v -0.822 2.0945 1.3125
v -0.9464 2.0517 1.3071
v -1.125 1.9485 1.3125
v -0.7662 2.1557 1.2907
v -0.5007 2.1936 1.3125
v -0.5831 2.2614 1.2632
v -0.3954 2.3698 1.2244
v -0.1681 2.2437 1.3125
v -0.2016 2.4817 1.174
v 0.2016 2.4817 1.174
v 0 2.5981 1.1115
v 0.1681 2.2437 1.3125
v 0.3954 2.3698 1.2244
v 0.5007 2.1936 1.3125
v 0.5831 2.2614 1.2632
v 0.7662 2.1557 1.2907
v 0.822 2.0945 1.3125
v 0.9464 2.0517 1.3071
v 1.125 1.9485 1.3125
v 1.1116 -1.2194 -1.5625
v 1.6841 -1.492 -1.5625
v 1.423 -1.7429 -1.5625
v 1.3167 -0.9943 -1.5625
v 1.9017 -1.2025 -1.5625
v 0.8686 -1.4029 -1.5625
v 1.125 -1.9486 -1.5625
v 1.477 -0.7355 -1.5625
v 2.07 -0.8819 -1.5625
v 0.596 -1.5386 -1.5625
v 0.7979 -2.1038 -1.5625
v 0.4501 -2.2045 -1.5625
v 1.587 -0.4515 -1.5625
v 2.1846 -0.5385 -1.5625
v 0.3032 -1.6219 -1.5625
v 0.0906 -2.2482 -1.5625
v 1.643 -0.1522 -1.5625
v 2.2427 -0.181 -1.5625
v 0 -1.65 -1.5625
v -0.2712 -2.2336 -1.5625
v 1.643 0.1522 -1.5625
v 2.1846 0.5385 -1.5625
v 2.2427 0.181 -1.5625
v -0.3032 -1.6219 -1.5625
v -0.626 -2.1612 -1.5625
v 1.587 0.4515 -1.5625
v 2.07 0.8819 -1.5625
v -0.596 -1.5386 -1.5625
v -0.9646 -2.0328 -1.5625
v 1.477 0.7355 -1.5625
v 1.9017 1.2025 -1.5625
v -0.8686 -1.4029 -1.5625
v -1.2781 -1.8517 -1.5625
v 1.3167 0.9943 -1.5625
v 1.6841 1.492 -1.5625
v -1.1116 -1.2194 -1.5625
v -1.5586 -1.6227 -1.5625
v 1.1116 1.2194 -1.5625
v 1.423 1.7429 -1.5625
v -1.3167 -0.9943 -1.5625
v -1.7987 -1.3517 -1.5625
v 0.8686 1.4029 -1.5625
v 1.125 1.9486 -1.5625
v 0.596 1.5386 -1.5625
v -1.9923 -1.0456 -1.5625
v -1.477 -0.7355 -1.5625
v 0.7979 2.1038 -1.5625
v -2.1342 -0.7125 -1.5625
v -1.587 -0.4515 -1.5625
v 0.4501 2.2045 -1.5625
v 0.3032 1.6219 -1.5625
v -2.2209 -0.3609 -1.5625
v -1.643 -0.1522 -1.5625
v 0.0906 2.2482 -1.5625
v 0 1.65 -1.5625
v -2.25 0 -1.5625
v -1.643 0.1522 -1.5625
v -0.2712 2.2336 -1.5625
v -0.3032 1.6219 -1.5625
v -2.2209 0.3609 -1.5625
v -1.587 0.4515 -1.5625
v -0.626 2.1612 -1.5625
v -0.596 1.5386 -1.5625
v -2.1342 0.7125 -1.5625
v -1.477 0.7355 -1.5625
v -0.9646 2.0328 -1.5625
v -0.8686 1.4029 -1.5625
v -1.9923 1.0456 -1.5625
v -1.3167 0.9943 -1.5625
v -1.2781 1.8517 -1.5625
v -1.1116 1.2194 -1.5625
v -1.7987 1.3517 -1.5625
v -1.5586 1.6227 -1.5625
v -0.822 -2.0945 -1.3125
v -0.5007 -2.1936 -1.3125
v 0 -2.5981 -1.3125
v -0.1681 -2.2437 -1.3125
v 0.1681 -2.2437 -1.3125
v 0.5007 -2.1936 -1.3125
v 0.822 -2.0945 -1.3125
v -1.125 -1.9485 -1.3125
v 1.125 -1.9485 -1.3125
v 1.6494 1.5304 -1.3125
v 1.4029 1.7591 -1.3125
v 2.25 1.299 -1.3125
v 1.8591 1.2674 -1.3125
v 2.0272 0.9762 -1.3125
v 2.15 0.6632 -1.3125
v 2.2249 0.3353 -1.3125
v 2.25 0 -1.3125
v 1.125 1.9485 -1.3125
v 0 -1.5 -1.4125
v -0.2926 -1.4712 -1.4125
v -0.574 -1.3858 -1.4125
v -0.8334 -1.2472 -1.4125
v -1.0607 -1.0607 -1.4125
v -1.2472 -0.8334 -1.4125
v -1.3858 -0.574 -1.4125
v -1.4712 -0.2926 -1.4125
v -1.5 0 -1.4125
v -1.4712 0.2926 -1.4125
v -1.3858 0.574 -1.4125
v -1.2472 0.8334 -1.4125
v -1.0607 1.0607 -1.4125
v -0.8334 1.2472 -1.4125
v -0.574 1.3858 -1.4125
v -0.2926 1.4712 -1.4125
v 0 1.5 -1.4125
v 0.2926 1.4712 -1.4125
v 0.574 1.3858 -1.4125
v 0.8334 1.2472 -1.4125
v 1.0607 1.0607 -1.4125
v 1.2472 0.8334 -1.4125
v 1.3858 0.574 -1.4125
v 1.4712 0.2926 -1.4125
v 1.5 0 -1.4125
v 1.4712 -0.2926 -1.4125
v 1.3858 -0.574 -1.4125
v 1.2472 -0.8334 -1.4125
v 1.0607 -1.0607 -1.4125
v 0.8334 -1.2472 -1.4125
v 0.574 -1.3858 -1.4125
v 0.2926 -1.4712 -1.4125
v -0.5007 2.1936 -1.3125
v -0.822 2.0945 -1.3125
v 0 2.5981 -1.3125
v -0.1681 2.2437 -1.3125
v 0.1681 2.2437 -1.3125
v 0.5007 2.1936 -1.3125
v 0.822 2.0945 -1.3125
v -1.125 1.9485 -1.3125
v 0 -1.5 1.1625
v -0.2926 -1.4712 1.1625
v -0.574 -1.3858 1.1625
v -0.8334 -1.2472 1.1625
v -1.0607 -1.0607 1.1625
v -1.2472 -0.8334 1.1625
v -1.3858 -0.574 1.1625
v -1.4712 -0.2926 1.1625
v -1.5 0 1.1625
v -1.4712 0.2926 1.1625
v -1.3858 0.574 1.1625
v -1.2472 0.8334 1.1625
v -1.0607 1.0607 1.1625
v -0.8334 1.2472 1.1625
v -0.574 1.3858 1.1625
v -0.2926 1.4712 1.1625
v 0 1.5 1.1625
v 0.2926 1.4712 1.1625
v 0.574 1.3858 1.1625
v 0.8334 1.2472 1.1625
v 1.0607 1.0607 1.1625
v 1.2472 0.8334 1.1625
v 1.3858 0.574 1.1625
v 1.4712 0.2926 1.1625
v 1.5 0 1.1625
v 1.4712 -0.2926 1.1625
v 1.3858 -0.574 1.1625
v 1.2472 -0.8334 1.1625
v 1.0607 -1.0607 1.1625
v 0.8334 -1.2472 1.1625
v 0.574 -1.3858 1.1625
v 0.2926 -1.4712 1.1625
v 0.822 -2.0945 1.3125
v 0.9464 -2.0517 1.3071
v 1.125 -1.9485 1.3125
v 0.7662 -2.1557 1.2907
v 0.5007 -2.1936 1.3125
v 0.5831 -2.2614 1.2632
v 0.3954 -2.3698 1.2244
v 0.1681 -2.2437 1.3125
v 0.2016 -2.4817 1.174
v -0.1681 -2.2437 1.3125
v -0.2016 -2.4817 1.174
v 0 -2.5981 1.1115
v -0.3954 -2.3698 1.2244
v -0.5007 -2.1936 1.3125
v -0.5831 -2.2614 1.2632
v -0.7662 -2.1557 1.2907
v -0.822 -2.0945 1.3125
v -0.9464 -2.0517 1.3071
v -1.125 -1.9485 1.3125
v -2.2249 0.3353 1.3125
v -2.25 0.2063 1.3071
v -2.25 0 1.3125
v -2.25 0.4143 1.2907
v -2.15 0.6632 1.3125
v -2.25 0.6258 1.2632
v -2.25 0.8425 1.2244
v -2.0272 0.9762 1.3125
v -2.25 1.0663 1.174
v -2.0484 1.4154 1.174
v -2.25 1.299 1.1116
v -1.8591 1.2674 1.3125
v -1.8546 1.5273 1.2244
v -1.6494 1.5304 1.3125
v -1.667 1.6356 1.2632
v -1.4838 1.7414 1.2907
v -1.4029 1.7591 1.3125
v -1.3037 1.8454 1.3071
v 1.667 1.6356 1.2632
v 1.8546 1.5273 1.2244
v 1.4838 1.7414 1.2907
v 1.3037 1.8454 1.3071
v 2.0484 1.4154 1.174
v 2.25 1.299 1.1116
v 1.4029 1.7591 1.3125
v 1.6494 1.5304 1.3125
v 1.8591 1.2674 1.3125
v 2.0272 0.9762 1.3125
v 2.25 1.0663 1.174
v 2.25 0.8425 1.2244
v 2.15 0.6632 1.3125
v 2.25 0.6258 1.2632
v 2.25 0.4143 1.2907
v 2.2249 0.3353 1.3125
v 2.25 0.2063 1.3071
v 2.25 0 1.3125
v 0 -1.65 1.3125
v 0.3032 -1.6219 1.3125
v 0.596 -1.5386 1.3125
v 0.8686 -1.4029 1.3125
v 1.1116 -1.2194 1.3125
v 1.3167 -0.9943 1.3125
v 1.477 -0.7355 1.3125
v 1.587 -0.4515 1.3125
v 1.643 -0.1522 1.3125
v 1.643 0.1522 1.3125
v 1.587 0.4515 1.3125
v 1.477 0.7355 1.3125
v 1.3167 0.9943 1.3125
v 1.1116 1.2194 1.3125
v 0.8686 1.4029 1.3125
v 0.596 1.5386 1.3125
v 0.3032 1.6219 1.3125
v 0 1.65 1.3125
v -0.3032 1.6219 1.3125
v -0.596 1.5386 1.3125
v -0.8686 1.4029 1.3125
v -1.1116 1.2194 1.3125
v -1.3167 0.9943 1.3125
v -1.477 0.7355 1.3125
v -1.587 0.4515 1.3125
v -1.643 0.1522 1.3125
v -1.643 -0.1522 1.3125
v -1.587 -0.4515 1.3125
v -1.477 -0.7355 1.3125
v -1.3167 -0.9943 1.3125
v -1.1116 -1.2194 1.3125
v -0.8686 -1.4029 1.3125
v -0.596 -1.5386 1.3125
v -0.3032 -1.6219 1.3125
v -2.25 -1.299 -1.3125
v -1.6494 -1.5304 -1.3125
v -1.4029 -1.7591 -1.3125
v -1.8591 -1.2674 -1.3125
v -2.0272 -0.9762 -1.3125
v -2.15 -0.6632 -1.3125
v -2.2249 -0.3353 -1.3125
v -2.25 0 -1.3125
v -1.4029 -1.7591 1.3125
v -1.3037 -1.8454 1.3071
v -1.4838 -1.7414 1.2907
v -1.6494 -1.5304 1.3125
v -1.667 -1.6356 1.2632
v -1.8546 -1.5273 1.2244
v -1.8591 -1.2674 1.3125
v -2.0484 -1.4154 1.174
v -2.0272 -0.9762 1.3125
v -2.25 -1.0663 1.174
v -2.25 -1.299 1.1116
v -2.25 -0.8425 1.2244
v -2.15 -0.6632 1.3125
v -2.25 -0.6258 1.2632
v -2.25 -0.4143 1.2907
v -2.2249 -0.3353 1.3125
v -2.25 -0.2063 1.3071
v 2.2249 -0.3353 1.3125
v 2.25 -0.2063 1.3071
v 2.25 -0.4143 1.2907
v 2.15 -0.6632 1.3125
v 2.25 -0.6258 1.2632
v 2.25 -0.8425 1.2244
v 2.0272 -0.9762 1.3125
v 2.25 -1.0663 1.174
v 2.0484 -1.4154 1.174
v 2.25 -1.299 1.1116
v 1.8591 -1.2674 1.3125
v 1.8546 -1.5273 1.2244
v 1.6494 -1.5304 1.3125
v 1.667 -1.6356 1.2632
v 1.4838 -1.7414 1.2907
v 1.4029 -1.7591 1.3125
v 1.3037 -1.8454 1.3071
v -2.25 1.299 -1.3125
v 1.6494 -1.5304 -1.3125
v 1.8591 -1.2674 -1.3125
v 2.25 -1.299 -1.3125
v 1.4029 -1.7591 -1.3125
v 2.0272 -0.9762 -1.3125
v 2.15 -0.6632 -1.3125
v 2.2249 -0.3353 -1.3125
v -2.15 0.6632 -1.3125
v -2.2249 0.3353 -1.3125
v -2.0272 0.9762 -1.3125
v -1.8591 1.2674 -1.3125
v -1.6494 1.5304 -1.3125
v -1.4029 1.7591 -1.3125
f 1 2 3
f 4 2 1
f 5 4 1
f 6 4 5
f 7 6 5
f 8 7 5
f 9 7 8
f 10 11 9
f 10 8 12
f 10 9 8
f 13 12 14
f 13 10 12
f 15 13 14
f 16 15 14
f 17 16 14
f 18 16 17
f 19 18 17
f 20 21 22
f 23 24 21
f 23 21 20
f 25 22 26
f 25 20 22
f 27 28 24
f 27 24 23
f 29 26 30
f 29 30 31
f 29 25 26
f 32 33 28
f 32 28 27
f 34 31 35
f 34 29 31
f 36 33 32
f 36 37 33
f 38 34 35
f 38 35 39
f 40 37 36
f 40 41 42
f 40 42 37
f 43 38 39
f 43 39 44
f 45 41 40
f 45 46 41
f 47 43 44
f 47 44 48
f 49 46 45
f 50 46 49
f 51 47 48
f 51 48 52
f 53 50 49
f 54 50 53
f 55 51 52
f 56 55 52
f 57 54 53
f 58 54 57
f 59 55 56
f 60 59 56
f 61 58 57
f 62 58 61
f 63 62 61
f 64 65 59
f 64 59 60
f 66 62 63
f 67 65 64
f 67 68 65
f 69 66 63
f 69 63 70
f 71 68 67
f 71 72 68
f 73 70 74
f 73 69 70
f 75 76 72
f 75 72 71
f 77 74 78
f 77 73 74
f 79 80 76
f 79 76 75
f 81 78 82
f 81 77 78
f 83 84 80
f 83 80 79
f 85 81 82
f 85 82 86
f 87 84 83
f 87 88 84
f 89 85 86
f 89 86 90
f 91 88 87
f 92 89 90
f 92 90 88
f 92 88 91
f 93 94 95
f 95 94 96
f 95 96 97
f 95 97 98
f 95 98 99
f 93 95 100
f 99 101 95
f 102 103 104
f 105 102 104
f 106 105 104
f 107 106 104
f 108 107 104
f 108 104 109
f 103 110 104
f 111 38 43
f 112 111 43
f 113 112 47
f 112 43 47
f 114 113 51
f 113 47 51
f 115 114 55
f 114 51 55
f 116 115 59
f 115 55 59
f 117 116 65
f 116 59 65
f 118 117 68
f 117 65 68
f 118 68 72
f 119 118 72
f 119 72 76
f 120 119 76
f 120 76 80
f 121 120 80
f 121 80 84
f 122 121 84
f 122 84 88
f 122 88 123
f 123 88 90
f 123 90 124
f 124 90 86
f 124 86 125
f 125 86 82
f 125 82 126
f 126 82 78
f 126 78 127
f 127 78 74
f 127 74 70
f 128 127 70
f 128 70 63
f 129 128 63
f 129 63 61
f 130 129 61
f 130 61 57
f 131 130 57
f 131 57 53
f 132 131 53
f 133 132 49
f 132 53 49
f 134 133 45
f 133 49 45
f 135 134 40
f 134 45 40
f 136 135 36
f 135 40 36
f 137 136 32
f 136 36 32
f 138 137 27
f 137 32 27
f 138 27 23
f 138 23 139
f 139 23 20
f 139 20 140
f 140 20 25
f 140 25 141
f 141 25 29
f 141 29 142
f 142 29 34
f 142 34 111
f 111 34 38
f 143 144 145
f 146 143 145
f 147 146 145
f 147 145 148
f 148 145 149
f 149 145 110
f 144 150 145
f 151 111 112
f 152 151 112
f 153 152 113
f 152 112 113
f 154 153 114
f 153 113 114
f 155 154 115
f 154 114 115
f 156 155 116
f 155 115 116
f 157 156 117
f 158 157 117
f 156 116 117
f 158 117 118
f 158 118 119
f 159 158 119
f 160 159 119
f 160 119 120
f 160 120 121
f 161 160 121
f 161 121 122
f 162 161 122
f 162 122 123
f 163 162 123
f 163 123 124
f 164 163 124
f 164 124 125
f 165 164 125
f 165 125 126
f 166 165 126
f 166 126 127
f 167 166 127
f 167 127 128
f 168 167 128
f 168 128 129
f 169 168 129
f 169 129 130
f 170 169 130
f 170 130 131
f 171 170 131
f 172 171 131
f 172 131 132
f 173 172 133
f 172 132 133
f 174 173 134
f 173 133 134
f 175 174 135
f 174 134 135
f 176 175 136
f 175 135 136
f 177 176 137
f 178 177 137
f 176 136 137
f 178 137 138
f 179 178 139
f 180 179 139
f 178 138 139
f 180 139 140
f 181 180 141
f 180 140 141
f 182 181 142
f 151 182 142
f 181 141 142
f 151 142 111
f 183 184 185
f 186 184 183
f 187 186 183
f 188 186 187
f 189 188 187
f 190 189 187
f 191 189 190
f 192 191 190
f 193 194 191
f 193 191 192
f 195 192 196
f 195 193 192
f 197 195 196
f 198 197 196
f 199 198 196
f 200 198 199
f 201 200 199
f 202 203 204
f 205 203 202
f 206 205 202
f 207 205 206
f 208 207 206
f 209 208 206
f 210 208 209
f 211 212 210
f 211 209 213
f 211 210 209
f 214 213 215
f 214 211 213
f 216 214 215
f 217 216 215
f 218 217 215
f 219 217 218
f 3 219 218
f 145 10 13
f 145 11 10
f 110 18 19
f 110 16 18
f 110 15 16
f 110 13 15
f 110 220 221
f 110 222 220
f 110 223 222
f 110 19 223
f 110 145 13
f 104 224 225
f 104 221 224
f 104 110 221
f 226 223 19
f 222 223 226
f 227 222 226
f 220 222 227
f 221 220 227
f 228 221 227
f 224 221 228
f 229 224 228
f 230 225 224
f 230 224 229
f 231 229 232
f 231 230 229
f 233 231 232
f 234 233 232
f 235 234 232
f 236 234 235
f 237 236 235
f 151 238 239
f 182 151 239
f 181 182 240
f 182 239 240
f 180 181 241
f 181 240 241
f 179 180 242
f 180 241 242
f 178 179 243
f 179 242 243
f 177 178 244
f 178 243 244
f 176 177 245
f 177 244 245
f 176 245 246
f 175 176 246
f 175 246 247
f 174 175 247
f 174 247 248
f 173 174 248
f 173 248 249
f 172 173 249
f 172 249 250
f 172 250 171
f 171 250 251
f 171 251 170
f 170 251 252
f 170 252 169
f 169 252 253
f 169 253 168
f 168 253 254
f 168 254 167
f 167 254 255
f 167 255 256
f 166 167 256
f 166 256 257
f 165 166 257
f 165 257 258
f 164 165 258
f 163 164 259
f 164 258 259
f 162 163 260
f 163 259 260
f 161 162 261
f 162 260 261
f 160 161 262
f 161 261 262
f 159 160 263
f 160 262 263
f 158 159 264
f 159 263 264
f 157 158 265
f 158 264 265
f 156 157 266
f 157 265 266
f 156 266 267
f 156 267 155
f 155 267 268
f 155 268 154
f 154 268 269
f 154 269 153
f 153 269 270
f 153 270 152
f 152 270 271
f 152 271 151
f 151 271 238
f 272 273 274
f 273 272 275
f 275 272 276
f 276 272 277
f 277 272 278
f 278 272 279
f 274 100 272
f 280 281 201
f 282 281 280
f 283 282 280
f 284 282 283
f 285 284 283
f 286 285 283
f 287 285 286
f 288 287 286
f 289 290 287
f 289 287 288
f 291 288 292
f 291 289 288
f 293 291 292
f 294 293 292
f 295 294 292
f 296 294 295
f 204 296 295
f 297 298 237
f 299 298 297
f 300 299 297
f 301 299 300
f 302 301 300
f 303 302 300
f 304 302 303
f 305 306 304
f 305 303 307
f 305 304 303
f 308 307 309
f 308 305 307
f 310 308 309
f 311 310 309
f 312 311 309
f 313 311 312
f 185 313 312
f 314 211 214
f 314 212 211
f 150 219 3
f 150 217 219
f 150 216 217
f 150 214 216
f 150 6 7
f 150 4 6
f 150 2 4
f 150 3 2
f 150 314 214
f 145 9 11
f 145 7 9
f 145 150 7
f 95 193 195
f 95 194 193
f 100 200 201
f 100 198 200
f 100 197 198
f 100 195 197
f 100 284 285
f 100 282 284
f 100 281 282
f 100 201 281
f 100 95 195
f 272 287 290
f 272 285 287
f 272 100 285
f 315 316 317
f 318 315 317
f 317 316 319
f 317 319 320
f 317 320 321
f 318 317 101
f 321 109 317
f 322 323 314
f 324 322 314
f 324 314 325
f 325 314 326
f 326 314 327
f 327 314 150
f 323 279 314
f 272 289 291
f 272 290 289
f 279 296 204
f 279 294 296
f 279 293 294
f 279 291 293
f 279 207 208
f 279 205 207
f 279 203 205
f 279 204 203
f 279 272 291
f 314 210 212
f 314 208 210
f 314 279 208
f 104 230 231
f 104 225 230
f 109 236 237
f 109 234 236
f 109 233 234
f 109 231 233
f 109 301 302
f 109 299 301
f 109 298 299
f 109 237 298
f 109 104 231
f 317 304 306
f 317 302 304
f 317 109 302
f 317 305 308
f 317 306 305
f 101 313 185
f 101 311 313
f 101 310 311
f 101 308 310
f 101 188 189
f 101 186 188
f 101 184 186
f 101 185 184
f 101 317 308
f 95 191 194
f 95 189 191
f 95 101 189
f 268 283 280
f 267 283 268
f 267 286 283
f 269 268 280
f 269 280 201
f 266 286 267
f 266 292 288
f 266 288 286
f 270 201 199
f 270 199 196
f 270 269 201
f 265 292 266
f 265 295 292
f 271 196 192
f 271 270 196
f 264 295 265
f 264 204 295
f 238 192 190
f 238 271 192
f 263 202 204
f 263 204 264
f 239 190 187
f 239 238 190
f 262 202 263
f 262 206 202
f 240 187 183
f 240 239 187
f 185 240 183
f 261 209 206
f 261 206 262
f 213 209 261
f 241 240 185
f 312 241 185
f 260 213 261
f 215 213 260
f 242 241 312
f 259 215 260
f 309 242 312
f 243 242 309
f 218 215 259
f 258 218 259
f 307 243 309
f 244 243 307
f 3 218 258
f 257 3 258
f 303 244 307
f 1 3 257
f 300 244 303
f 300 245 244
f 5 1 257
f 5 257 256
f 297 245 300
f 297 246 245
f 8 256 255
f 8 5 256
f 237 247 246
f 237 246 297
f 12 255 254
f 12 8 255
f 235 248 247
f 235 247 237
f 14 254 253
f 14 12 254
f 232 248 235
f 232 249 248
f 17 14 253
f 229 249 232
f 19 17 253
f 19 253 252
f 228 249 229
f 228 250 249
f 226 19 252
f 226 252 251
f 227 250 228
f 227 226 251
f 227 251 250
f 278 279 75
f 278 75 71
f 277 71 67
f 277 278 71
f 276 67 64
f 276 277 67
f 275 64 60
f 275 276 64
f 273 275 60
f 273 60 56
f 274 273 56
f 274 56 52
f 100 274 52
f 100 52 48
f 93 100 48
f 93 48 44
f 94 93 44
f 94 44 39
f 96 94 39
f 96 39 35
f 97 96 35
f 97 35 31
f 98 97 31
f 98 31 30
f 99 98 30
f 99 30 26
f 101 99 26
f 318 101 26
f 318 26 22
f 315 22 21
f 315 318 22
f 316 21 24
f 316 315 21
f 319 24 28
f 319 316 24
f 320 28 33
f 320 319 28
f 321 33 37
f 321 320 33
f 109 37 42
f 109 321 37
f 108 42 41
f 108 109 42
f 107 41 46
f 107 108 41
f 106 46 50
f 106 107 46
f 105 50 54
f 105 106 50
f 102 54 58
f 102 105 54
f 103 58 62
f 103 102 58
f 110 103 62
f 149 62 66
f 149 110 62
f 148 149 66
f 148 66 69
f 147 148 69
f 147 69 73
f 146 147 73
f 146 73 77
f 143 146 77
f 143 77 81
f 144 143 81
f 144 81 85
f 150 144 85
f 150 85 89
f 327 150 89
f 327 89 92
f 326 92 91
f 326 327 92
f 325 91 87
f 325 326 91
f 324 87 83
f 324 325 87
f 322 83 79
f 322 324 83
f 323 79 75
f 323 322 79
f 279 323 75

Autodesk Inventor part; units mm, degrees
ref_plane "YZ Plane" through (0, 0, 0) normal (1, 0, 0) x (0, 1, 0)
ref_plane "XZ Plane" through (0, 0, 0) normal (0, 1, 0) x (-1, 0, 0)
ref_plane "XY Plane" through (0, 0, 0) normal (0, 0, 1) x (1, 0, 0)
sketch "Sketch1" plane through (0, 0, 0) normal (0, 0, 1) x (1, 0, 0)
  line L0 (0, 2.5981) -> (2.25, 1.299)
  line L1 (2.25, 1.299) -> (2.25, -1.299)
  line L2 (2.25, -1.299) -> (0, -2.5981)
  line L3 (0, -2.5981) -> (-2.25, -1.299)
  line L4 (-2.25, -1.299) -> (-2.25, 1.299)
  line L5 (-2.25, 1.299) -> (0, 2.5981)
  circle A0 centre (0, 0) radius 1.5 construction
  dimension "Diameter" = 3
  dimension "Width_Across_Flats" = 4.5
extrude "Extrusion1" add sketch "Sketch1" along normal mid plane 2.625
sketch "Sketch2" plane through (0, 0, 0) normal (0, 1, 0) x (-1, 0, 0)
  line L0 (-2.25, 1.3125) -> (-2.25, -1.3125) construction
  line L1 (0, 0) -> (0, 4.375)
  line L2 (-2.25, 1.3125) -> (-3.75, 1.3125)
  line L3 (-3.75, 1.3125) -> (-3.75, 0.4465)
  line L4 (-3.75, 0.4465) -> (-2.25, 1.3125)
  dimension "Chamfer_Angle" = 30
  dimension "Chamfer_Size" = 1.5
revolve "Revolution1" cut sketch "Sketch2" angle 360 about axis through (0, 0, 0) along (0, 0, 1)
sketch "Sketch3" plane through (0, 0, -1.3125) normal (0, 0, -1) x (-1, 0, 0)
  line L0 (2.25, -1.299) -> (0, -2.5981) construction
  circle A0 centre (0, 0) radius 2.25
extrude "Extrusion2" add sketch "Sketch3" along normal blind 0.25
hole "Hole1" at (0, 0, 1.3125) direction (0, 0, -1) diameter 3 end through all
thread "Thread1" size "M3x0.5" class "6H" standard "ANSI Metric M Profile" full length
chamfer "Chamfer1" distance 0.15 angle 45 2 edges at (0, 1.5, 1.3125) (0, 1.5, -1.5625)
equation "\"Width_Across_Flats\" = 1.5 * Diameter"
equation "\"Thickness\" = 0.875 * Diameter"
equation "\"Chamfer_Size\" = 0.5 * Diameter"
equation "\"Hole_Diameter\" = Diameter"
properties part number "Hex Nut with Washer Face"
